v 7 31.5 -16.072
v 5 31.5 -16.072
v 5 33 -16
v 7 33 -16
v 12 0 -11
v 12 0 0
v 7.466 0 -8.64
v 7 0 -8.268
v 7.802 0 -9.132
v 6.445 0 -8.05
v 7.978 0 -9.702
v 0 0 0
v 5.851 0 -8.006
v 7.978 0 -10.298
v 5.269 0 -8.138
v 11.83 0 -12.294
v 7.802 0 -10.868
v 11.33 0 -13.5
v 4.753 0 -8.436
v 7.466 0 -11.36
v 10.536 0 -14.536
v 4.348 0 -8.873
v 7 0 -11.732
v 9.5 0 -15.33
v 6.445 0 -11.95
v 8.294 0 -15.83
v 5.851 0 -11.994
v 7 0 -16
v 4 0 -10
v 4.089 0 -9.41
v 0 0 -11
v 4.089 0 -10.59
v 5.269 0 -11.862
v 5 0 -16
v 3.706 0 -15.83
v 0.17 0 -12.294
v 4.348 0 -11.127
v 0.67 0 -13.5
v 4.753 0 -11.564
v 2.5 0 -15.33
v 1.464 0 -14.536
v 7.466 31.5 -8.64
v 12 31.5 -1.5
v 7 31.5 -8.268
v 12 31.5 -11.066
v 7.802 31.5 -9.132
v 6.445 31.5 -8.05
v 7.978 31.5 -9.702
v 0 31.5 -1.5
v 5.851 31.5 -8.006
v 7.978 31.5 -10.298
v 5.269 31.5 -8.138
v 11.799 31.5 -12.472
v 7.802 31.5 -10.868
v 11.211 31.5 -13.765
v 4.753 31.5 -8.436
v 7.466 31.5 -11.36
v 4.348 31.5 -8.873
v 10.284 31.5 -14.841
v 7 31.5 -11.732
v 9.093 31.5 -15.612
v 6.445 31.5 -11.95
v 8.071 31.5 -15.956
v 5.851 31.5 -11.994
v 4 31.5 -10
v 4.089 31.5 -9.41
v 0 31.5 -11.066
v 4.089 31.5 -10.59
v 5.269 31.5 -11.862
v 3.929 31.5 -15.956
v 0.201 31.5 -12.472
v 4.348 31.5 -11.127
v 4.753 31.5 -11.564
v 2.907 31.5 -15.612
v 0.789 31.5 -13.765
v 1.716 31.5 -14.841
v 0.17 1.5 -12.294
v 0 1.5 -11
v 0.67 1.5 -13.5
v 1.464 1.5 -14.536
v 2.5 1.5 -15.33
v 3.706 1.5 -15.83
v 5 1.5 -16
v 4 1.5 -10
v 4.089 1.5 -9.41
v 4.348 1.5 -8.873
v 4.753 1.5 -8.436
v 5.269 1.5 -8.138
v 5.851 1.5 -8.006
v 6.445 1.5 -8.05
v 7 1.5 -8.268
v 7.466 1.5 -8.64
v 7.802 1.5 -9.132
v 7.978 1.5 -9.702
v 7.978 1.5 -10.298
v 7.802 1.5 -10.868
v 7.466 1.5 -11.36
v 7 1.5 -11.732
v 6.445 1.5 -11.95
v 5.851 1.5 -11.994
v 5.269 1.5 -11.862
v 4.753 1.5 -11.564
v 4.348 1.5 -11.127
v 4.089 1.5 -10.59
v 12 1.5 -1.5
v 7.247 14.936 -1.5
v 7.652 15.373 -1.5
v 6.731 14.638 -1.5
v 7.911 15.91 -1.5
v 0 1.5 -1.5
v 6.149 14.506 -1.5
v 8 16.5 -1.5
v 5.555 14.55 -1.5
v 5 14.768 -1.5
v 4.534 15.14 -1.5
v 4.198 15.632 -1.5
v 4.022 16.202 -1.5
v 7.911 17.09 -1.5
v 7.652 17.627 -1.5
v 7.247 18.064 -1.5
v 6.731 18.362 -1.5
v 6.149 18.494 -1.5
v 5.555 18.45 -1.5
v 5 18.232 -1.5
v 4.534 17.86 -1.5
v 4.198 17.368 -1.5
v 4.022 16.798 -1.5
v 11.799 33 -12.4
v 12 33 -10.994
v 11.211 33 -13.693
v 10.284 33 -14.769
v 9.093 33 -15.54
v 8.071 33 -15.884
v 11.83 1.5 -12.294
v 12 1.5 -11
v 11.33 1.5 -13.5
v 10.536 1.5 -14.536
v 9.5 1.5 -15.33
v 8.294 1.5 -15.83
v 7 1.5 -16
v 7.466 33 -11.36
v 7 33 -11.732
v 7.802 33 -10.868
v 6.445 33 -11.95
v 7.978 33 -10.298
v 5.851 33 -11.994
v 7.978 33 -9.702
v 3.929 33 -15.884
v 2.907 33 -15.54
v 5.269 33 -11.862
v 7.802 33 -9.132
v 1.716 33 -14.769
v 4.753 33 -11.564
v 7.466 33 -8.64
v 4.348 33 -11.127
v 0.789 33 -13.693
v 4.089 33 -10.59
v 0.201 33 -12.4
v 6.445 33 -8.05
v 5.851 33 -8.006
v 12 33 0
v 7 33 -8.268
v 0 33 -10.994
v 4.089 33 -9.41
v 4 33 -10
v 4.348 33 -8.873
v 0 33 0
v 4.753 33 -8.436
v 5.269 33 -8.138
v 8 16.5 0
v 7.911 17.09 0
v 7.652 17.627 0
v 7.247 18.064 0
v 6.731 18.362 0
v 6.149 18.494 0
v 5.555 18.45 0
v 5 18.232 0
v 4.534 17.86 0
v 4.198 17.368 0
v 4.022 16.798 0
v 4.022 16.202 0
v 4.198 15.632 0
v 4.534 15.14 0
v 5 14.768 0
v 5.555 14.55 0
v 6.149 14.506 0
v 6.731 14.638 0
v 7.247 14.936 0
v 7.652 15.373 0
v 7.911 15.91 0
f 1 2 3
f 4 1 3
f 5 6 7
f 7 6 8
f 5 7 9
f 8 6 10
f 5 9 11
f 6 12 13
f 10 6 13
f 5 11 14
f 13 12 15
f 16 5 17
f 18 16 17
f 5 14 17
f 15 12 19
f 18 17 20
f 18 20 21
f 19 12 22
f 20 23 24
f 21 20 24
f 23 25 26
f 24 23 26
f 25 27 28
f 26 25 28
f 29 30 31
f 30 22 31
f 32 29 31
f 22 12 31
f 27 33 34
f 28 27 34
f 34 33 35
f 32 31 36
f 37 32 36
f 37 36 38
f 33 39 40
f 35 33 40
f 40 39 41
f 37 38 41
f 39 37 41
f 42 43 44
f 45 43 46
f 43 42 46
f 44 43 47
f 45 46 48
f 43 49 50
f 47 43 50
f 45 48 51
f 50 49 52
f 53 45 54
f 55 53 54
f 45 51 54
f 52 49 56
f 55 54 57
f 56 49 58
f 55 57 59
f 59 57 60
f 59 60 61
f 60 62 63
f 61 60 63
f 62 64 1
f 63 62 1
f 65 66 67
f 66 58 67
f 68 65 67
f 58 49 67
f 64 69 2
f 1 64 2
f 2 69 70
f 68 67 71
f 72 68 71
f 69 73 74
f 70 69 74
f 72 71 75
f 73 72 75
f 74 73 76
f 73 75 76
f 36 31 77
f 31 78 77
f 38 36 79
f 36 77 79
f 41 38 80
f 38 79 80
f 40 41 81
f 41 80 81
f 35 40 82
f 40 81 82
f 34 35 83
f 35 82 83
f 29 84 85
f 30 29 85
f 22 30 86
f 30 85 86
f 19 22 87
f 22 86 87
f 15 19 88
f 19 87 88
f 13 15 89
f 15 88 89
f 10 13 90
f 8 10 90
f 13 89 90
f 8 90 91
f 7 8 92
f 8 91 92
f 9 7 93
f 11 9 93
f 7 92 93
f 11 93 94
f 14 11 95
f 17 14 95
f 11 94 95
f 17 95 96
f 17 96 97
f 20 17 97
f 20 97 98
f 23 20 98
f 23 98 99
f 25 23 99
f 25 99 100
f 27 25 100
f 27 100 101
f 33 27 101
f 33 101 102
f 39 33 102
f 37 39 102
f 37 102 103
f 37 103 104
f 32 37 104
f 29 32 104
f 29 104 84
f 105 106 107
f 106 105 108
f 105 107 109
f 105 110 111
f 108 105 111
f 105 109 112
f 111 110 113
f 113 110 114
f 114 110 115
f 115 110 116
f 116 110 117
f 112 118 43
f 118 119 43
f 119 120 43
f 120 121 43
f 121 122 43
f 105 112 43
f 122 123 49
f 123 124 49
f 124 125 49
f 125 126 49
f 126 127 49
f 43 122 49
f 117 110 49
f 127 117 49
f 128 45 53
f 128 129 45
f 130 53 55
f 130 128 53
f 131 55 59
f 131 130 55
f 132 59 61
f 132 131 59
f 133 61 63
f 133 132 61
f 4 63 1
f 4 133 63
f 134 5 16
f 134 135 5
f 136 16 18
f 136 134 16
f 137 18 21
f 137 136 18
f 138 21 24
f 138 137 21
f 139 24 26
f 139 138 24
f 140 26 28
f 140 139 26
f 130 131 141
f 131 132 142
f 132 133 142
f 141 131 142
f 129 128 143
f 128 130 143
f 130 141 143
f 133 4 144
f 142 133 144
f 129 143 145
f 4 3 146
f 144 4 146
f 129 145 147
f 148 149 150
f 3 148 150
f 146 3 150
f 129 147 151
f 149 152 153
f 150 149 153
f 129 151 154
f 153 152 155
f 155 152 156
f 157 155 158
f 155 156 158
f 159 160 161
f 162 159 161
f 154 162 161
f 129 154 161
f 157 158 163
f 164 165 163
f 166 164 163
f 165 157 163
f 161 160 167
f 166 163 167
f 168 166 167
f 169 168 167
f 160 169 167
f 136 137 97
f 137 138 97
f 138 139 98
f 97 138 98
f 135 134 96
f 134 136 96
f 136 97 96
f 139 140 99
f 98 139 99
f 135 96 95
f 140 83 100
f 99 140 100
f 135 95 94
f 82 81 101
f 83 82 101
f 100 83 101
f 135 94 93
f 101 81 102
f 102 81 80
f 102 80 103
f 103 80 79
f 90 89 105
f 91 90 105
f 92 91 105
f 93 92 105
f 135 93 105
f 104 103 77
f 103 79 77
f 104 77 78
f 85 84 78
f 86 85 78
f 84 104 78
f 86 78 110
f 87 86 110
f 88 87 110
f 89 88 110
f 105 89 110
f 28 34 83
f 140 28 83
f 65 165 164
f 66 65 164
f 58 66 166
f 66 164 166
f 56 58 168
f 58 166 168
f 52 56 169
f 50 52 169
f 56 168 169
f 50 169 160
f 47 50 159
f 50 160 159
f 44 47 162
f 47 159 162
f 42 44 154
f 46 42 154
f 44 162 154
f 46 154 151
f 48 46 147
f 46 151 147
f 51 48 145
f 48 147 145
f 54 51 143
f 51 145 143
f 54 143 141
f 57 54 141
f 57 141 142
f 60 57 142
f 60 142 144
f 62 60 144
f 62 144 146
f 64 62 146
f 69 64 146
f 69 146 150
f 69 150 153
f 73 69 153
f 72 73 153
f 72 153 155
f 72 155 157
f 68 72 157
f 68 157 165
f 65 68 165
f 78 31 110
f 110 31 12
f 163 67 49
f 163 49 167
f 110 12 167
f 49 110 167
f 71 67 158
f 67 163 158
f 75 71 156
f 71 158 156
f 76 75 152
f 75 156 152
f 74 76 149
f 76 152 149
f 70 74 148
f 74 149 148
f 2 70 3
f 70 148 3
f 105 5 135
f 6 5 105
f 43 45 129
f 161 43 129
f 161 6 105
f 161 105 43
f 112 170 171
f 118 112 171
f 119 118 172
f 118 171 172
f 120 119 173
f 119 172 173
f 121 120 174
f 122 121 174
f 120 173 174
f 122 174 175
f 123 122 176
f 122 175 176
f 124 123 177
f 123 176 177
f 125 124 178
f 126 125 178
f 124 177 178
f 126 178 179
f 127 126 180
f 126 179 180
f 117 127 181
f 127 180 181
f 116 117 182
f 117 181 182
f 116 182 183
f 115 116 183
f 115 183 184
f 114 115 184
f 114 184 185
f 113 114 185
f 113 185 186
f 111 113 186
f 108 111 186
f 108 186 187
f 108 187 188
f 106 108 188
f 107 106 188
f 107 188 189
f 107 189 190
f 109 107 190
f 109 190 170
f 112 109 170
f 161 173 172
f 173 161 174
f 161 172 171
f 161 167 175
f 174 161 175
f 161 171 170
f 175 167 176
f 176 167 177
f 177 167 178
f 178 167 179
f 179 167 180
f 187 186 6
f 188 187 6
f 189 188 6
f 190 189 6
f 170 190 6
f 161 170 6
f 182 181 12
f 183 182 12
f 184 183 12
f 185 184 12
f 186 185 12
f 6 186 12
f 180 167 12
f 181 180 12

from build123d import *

# Parameters (mm, degrees)
F1_DEPTH = 12
F2_R     = 2
F3_DEPTH = 25
F4_R     = 2
F5_DEPTH = 45
F6_R     = 5


with BuildPart() as f1:
    # F0 (on Right) → F1 (new body)
    with BuildSketch(Plane.YZ):
        Polygon((33, 0), (0, 0), (0, -16), (1.5, -16), (1.5, -1.5), (31.5, -1.5), (31.5, -16.072011), (33, -16), align=None)
    extrude(amount=F1_DEPTH)

    # F2 (on face) → F3 (cut)
    with BuildSketch(Plane.XY):
        with Locations((6, 16.5)):
            Circle(F2_R)
    extrude(amount=-F3_DEPTH, mode=Mode.SUBTRACT)

    # F4 (on face) → F5 (cut)
    with BuildSketch(Plane(origin=(0, 33, 0), x_dir=(-1, 0, 0), z_dir=(0, 1, 0))):
        with Locations((-6, -10)):
            Circle(F4_R)
    extrude(amount=-F5_DEPTH, mode=Mode.SUBTRACT)

    # F6
    f6_edges = [f1.edges().sort_by_distance(p)[0] for p in [
        (0, 32.25, -16.036005),
        (12, 32.25, -16.036005),
        (12, 0.75, -16),
        (0, 0.75, -16),
    ]]
    fillet(f6_edges, radius=F6_R)


solid = f1.part
